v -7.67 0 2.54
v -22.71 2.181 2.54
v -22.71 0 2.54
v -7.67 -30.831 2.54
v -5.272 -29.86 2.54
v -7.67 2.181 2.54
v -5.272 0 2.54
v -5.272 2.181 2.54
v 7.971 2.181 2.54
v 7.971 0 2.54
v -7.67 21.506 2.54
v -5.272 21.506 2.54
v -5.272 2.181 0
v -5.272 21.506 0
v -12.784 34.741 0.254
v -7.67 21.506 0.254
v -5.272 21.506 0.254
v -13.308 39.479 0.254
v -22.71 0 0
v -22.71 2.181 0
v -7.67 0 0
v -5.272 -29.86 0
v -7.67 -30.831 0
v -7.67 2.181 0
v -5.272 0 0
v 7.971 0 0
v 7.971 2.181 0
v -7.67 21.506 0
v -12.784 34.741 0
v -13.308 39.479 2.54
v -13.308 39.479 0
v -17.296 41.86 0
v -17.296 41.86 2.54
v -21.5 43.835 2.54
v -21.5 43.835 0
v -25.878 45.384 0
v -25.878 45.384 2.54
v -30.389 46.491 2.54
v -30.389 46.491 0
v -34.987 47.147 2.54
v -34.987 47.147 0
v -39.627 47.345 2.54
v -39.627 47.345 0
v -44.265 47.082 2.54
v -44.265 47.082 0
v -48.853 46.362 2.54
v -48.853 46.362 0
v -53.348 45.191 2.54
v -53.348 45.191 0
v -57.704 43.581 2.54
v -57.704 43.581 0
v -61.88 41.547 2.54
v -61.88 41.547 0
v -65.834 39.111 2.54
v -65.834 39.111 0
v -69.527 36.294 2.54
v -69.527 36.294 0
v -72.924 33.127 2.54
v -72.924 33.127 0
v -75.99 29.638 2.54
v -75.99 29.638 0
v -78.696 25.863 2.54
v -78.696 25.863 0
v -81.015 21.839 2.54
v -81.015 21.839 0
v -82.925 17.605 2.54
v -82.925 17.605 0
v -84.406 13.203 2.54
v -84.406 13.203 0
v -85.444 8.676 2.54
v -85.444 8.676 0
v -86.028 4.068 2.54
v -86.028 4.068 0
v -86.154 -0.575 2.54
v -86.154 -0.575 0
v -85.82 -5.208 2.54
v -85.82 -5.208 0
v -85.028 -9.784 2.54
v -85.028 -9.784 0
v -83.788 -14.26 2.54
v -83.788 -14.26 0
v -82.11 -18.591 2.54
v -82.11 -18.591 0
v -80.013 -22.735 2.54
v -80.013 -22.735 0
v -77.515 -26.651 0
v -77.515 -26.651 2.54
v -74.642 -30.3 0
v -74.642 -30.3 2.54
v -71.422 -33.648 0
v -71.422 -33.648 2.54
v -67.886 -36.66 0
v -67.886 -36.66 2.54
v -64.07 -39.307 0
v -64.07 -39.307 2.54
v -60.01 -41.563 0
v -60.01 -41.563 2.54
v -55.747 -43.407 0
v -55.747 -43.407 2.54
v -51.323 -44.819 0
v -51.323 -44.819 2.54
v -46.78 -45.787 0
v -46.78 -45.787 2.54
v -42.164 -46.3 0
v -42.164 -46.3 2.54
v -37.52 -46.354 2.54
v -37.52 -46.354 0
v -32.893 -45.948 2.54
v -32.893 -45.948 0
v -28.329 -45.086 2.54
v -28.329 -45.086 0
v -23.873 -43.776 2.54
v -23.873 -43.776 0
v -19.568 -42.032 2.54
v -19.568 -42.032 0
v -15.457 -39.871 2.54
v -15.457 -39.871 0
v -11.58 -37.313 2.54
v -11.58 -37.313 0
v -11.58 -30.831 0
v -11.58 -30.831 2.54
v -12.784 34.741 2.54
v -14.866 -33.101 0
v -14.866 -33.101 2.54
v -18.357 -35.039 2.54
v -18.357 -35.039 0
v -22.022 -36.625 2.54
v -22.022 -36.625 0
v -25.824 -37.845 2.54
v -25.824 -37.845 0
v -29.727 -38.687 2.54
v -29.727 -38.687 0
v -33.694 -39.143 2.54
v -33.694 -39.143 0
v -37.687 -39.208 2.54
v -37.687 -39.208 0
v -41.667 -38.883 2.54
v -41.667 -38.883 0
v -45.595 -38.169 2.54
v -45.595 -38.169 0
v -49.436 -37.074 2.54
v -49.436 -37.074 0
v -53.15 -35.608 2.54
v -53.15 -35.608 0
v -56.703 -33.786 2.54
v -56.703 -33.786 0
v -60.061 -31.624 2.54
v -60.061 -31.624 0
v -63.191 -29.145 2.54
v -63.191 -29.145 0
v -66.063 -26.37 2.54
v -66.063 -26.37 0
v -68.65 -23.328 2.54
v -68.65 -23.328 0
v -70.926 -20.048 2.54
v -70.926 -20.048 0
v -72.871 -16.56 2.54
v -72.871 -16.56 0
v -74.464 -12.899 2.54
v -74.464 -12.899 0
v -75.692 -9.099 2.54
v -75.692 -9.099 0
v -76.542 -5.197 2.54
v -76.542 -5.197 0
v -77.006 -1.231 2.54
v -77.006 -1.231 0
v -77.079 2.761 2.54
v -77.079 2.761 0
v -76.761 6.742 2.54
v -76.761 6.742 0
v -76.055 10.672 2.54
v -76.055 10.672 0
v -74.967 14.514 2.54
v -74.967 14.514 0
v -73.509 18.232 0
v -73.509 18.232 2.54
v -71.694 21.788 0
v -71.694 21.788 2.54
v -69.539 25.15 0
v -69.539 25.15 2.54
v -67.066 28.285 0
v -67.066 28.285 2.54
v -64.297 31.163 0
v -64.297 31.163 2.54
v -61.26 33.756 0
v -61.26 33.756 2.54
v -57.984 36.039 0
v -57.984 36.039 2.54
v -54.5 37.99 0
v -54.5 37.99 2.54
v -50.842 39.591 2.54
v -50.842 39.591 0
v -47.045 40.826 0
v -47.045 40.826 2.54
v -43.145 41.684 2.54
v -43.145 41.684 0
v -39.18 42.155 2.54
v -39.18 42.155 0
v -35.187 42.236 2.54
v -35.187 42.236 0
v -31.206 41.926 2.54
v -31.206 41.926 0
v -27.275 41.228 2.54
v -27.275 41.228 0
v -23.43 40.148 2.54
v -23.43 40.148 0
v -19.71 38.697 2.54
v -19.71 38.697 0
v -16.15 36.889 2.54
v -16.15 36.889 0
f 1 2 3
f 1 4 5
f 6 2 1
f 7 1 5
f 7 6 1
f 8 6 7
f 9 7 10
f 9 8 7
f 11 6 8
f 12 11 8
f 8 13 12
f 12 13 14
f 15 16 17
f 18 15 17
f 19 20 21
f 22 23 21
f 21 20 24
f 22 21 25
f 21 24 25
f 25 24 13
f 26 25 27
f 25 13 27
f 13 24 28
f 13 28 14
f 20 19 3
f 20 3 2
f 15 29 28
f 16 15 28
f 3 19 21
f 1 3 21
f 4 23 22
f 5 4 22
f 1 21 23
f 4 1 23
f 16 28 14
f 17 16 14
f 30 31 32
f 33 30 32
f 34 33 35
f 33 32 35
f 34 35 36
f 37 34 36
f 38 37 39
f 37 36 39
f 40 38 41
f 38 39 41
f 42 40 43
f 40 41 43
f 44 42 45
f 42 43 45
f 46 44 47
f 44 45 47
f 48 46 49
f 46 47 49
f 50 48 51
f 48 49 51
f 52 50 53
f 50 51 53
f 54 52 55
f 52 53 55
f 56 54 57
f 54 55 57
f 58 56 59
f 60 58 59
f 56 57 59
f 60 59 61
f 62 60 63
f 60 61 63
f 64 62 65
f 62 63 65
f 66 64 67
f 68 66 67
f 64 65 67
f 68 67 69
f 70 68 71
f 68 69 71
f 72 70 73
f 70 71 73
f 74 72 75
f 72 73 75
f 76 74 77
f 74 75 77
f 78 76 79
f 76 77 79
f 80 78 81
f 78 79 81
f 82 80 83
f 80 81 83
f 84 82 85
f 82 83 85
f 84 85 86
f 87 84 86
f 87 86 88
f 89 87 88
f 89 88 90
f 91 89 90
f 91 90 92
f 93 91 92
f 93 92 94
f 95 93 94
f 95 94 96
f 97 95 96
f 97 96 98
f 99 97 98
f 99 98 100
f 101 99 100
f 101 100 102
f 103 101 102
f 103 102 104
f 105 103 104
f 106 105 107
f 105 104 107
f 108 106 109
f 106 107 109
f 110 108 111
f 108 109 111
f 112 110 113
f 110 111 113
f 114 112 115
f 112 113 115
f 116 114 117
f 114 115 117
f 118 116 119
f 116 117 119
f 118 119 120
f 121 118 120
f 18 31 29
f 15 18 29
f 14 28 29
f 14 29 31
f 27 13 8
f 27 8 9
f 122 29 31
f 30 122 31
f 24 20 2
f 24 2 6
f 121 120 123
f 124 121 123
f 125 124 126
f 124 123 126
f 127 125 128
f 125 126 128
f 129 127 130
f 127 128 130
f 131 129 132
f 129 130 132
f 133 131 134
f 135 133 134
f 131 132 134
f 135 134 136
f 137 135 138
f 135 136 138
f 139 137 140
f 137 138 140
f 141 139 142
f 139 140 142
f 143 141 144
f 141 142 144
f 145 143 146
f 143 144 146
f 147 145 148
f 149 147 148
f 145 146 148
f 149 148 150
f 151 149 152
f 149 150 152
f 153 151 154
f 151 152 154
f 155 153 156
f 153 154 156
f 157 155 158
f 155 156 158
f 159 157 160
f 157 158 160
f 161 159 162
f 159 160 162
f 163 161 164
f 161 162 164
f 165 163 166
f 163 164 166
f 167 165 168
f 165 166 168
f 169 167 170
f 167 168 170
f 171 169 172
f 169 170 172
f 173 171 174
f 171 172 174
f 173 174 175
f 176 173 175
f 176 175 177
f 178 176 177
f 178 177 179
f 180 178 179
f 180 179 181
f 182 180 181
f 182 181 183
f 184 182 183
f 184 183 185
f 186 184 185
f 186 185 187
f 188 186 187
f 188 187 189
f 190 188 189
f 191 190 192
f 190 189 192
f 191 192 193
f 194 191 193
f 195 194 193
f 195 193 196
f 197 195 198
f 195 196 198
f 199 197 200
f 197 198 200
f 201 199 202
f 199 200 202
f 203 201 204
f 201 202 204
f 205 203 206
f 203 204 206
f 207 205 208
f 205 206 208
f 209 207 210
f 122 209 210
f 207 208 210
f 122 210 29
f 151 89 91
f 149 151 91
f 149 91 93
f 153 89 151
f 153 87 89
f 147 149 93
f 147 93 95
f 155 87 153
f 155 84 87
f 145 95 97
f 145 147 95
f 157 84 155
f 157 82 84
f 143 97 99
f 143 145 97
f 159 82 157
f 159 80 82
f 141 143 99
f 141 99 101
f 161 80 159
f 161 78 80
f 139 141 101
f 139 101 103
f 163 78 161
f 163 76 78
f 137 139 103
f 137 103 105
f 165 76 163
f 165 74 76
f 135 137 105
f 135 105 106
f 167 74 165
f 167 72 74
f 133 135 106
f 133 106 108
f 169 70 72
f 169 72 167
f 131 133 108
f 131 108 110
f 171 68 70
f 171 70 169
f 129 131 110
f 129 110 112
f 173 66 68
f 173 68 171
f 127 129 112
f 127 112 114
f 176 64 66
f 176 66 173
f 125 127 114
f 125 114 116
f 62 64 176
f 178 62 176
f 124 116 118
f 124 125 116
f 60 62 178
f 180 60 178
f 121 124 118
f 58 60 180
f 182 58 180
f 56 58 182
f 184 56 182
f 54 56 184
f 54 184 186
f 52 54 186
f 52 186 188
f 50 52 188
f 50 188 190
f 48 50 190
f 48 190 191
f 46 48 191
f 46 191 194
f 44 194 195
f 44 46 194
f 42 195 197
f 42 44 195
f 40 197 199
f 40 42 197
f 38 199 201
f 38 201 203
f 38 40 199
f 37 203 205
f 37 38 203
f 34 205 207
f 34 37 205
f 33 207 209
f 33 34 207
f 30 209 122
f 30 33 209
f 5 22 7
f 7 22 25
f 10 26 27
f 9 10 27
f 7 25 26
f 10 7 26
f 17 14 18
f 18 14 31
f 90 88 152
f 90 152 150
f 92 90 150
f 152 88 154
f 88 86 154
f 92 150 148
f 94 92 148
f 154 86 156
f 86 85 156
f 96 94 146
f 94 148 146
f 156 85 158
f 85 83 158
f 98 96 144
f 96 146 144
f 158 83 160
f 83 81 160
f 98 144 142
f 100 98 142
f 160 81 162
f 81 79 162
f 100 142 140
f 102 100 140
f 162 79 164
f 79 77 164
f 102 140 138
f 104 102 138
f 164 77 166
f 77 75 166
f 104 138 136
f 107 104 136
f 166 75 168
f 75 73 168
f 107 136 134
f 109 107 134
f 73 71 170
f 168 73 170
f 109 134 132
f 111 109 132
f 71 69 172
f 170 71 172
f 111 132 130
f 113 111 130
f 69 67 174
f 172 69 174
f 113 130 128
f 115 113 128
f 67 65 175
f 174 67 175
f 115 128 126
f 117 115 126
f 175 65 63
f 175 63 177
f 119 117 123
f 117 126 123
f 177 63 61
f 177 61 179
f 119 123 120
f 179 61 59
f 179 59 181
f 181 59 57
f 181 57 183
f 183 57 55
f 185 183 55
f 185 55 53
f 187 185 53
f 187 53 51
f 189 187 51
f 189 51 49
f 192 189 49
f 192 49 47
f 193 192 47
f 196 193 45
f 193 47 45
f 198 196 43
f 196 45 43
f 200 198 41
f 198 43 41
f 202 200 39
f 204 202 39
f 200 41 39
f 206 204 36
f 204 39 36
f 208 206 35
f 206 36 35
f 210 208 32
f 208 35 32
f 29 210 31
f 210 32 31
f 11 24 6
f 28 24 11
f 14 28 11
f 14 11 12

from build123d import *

# Parameters (mm, degrees)
F1_DEPTH = 2.54
F0_W     = 2.3982011194
F0_H     = 19.3259103689
F0_W_2   = 15.039473772
F0_H_2   = 2.1805369761
F0_W_3   = 13.2428539504
F2_DEPTH = 0.254


with BuildPart() as f1:
    # F0 (on Top) → F1 (new body)
    with BuildSketch(Plane.XY):
        with BuildLine():
            ThreePointArc((-11.580394581, -30.8309197426), (-77.0911936393, 0.7641380252), (-12.78355252, 34.7411856055))
            Line((-12.78355252, 34.7411856055), (-13.3079187945, 39.4789241254))
            ThreePointArc((-13.3079187945, 39.4789241254), (-86.1539650826, -0.5750175297), (-11.580394581, -37.3125635087))
            Line((-11.580394581, -37.3125635087), (-11.580394581, -30.8309197426))
        make_face()
    extrude(amount=F1_DEPTH)


with BuildPart() as f1b:
    # F0 (on Top) → F1, piece 2 (new body)
    with BuildSketch(Plane.XY):
        with Locations((-6.4710318836, 11.8434921606)):
            Rectangle(F0_W, F0_H)
        Polygon((-7.6701324433, 0), (-7.6701324433, -30.8309197426), (-5.2719313239, -29.8604014784), (-5.2719313239, 0), align=None)
        with Locations((-15.1898693293, 1.090268488)):
            Rectangle(F0_W_2, F0_H_2)
        with Locations((1.3494956513, 1.090268488)):
            Rectangle(F0_W_3, F0_H_2)
        with Locations((-6.4710318836, 1.090268488)):
            Rectangle(F0_W, F0_H_2)
    extrude(amount=F1_DEPTH)


with BuildPart() as f2:
    # F0 (on Top) → F2 (new body)
    with BuildSketch(Plane.XY):
        Polygon((-13.3079187945, 39.4789241254), (-12.78355252, 34.7411856055), (-7.6701324433, 21.506447345), (-5.2719313239, 21.506447345), align=None)
    extrude(amount=F2_DEPTH)


solid = Compound([f1.part, f1b.part, f2.part])
